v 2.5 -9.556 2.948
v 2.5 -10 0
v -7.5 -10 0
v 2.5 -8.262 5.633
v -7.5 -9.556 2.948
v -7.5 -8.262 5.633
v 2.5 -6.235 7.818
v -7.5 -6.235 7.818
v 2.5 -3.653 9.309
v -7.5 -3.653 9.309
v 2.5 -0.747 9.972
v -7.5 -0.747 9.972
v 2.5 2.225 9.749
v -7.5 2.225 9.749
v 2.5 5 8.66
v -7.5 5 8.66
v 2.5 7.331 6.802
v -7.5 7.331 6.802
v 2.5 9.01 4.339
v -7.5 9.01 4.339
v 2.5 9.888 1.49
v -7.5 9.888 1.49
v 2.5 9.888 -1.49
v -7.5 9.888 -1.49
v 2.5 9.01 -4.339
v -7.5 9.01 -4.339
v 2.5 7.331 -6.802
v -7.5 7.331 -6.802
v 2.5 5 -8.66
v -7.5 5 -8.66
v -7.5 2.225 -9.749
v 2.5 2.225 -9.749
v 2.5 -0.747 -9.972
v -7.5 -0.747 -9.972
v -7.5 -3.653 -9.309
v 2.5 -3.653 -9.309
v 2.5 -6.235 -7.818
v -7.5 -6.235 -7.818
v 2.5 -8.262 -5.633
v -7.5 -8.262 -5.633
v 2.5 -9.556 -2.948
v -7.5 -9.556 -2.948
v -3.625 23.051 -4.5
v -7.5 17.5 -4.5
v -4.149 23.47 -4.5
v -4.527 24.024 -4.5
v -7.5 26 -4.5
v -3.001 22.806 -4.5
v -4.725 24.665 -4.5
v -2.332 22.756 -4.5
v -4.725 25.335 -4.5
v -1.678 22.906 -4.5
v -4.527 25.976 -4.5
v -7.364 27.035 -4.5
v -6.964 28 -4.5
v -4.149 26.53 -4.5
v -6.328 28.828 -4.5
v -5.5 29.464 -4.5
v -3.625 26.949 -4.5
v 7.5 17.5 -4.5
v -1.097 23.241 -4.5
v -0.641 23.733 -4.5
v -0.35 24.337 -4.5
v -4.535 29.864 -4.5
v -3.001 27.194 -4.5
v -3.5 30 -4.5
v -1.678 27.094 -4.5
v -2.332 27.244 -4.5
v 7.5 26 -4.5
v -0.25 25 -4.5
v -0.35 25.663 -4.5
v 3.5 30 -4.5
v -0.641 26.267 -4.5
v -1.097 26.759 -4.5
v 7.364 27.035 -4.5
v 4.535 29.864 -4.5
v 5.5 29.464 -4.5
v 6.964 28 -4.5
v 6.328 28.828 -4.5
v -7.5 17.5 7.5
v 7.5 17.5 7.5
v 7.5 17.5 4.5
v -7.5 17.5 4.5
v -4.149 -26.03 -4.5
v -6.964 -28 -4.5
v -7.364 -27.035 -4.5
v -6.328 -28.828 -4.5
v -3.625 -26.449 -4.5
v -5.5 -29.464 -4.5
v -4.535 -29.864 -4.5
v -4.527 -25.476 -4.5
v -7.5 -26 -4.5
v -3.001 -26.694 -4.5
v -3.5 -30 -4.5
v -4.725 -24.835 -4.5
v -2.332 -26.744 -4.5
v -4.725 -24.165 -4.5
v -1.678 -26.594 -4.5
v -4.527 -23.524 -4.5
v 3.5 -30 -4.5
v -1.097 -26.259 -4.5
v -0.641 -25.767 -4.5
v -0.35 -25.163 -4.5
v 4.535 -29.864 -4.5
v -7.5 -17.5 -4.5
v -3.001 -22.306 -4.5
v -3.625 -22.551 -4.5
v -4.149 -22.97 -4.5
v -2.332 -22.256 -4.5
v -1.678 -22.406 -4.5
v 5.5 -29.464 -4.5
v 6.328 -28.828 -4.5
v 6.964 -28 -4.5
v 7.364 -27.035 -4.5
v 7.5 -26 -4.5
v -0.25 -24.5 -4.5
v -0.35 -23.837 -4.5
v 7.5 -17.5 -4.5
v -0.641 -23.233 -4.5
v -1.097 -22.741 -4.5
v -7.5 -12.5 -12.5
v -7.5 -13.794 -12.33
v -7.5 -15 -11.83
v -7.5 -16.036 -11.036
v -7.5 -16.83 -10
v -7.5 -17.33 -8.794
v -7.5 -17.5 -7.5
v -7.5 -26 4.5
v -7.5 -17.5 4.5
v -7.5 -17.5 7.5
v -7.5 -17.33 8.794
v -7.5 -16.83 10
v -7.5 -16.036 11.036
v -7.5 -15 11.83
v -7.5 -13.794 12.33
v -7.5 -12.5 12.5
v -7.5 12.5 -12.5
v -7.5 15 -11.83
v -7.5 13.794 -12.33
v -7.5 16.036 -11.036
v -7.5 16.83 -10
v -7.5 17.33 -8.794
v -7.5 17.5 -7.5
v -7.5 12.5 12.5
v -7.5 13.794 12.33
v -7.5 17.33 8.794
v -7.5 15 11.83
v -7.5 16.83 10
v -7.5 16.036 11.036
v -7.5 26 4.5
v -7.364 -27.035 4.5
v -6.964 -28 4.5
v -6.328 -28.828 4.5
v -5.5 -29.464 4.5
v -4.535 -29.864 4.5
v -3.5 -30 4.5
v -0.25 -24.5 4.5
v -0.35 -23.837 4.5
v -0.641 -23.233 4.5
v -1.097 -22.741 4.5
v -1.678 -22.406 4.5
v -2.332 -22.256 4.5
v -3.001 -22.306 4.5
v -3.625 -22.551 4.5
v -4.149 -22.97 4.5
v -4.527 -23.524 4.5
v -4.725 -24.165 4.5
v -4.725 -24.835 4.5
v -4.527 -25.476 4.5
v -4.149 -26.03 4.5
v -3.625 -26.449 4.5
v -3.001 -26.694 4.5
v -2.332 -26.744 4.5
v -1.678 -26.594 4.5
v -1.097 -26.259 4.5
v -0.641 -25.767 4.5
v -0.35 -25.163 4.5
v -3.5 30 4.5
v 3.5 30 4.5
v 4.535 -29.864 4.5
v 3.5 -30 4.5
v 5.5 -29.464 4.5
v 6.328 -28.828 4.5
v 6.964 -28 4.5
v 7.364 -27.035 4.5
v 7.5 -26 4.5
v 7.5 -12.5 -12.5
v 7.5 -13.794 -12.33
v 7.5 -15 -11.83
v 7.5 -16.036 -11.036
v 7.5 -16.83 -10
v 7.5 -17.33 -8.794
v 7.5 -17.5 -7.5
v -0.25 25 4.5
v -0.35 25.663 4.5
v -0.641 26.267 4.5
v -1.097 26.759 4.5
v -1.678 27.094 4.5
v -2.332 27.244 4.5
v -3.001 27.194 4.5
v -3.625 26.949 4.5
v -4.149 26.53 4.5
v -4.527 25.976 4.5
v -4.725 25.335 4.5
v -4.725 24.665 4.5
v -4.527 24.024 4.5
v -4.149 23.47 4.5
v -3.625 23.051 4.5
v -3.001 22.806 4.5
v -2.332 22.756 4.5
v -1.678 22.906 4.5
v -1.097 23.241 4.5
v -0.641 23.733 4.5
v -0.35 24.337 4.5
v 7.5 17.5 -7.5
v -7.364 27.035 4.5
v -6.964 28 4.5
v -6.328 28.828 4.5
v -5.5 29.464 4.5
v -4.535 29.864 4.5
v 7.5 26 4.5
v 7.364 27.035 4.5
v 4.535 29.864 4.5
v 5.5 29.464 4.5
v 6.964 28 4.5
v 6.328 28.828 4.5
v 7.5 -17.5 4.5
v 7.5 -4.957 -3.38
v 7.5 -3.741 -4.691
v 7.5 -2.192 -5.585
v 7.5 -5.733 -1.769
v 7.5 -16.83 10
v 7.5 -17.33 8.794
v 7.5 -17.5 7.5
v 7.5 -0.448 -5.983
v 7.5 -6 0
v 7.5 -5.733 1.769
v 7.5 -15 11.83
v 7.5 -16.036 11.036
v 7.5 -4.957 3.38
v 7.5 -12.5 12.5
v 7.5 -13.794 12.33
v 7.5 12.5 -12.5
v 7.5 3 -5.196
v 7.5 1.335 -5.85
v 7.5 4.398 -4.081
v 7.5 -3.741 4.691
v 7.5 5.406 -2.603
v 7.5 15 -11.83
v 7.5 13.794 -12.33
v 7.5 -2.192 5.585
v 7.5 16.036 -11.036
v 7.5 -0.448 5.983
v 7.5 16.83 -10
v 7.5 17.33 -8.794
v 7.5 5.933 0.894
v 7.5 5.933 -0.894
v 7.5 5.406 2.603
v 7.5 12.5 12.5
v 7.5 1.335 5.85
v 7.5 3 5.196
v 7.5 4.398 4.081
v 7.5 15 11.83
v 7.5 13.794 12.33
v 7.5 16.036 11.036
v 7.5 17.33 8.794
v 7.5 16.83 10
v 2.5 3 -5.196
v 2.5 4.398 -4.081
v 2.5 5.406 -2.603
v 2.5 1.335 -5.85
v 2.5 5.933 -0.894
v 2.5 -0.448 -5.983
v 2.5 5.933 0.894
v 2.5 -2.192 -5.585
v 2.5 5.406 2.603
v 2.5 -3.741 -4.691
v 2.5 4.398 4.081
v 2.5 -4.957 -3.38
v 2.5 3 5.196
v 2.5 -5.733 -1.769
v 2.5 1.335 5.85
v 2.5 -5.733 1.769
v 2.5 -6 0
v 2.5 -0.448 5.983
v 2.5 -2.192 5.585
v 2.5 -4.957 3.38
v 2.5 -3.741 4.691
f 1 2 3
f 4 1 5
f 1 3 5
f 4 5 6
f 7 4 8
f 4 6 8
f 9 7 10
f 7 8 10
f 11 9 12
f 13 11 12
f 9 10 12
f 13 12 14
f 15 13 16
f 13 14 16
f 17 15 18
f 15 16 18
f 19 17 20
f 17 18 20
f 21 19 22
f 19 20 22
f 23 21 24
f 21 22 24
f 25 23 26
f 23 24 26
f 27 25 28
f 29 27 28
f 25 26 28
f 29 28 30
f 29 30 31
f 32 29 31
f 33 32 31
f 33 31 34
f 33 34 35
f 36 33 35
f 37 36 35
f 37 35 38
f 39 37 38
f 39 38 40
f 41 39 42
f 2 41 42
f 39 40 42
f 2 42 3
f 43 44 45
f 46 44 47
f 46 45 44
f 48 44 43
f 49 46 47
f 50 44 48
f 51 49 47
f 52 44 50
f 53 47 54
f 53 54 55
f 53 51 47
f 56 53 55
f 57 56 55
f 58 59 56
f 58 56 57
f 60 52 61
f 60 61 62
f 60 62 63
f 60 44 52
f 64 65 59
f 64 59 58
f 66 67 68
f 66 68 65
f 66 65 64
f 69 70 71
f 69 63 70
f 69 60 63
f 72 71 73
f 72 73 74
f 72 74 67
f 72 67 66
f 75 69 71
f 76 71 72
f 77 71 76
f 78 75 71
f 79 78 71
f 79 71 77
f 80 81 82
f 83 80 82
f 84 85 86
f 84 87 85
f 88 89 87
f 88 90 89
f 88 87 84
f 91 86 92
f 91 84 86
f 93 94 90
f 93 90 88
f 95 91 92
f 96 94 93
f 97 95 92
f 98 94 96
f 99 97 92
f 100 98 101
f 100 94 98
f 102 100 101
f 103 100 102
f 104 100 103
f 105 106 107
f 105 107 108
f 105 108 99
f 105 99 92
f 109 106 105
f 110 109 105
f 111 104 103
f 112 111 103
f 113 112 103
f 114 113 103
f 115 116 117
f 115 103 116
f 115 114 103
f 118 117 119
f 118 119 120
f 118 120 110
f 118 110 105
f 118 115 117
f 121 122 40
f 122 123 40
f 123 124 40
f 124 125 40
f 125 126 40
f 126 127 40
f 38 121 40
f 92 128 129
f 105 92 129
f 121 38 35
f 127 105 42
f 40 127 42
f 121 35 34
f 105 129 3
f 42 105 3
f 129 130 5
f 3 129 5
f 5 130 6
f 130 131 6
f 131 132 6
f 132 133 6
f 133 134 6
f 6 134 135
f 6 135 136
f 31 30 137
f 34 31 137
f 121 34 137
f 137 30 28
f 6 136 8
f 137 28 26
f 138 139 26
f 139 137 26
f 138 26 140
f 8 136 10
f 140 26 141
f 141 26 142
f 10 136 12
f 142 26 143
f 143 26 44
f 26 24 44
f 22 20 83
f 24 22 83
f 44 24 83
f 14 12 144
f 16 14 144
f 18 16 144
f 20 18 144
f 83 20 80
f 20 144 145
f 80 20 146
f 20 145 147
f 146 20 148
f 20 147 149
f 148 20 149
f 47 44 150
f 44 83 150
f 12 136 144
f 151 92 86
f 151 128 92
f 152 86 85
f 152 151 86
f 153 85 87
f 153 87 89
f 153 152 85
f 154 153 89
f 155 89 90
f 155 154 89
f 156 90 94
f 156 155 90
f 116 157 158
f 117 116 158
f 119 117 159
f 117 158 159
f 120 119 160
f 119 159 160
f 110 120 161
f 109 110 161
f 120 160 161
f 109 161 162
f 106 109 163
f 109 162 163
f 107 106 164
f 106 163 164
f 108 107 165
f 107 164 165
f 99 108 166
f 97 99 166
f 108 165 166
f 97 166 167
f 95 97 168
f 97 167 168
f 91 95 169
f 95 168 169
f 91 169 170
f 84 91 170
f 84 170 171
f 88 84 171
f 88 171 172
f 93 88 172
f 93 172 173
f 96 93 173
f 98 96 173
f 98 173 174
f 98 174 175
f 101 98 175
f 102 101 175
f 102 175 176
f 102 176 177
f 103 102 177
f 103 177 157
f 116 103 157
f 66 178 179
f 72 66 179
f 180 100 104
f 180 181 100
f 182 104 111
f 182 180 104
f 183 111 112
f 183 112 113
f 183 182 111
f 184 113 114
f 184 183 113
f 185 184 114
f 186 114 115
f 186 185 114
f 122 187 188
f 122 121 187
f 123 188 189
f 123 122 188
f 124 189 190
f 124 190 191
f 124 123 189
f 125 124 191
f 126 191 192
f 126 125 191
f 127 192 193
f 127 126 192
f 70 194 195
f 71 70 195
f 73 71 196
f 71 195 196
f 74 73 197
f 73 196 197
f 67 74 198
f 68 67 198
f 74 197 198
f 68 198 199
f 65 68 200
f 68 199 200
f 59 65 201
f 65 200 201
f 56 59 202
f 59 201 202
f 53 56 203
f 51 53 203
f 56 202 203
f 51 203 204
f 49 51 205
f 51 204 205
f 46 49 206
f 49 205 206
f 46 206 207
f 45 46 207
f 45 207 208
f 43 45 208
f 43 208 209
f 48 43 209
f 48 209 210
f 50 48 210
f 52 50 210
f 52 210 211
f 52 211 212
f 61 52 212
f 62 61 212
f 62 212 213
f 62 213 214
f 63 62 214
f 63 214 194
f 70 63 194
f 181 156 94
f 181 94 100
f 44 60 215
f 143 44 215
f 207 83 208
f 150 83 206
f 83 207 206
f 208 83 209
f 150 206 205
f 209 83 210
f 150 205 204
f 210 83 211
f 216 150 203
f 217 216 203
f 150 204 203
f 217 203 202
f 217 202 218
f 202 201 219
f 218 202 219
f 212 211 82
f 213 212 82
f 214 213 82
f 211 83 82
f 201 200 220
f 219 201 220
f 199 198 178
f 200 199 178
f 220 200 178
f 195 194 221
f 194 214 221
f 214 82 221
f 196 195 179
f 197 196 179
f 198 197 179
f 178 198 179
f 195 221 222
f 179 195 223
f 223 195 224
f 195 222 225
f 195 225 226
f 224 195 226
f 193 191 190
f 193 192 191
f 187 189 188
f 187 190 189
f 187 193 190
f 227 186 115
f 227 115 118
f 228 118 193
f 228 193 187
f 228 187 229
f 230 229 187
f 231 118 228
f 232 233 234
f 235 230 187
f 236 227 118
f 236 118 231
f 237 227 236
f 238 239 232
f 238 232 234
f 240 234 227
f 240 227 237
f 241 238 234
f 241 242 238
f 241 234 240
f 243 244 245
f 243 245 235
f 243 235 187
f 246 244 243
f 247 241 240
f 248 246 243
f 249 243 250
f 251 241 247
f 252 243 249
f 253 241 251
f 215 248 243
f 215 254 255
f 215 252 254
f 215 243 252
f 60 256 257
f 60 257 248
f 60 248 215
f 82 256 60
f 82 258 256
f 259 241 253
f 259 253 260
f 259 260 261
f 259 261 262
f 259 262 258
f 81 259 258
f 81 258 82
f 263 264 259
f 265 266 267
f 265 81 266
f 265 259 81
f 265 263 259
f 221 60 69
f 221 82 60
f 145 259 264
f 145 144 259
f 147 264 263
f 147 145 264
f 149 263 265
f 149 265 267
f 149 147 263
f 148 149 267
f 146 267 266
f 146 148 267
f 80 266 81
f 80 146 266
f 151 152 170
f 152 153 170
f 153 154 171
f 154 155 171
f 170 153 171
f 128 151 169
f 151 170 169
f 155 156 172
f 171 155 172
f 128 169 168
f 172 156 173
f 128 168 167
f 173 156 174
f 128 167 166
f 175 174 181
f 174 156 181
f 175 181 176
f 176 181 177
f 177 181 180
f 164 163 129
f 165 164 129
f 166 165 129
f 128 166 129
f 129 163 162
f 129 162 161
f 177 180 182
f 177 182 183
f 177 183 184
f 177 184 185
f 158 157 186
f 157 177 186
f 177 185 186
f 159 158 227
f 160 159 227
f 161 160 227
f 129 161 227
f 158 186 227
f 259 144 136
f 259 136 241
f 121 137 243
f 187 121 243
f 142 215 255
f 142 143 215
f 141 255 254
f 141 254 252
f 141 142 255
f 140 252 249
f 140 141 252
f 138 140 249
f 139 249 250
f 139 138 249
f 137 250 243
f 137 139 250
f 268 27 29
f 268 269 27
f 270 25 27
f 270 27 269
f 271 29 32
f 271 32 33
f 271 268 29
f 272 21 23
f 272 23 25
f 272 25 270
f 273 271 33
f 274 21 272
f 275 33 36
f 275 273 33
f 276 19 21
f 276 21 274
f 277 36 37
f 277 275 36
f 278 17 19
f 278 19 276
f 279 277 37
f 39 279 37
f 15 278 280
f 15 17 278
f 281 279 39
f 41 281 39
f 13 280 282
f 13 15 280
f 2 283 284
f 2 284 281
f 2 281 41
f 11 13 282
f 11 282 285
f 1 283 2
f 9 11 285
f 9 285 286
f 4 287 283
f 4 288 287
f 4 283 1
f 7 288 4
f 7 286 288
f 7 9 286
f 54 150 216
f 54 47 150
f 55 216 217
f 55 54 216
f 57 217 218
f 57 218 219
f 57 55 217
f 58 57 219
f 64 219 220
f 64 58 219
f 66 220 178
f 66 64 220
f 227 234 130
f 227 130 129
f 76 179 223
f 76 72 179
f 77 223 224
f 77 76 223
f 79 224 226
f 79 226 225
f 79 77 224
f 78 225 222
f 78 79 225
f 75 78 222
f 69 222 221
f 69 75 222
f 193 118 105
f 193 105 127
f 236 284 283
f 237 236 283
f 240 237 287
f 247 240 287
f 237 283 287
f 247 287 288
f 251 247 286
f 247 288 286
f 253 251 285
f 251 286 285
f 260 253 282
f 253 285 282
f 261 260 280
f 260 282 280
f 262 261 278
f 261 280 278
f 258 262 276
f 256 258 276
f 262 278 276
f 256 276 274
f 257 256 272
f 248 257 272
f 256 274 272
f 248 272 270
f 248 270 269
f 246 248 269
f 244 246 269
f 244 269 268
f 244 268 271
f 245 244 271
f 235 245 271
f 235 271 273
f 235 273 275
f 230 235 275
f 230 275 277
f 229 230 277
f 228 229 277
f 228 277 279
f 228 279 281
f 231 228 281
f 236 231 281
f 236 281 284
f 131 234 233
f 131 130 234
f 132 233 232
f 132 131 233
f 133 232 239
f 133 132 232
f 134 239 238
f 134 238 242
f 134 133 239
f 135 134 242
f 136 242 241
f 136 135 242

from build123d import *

# Parameters (mm, degrees)
SKETCH2_W           = 15
SKETCH2_H           = 60
BOSS_EXTRUDE1_DEPTH = 12.5
SKETCH3_W           = 8
SKETCH3_H           = 12.5
CUT_EXTRUDE1_DEPTH  = 36.794552658
SKETCH4_R           = 2.25
CUT_EXTRUDE2_DEPTH  = 36.288099977
FILLET1_R           = 5
FILLET2_R           = 4
SKETCH5_R           = 6
CUT_EXTRUDE3_DEPTH  = 36.794552658
SKETCH6_R           = 10
CUT_EXTRUDE4_DEPTH  = 10


with BuildPart() as part:
    # Sketch2 → Boss-Extrude1 (new, symmetric)
    with BuildSketch(Plane.XY):
        Rectangle(SKETCH2_W, SKETCH2_H)
    extrude(amount=BOSS_EXTRUDE1_DEPTH, both=True)

    # Sketch3 → Cut-Extrude1 (cut, through all)
    with BuildSketch(Plane(origin=(7.5, 0, 0), x_dir=(0, 0, -1), z_dir=(1, 0, 0))):
        with Locations((-8.5, -23.75)):
            Rectangle(SKETCH3_W, SKETCH3_H)
        with Locations((8.5, -23.75)):
            Rectangle(SKETCH3_W, SKETCH3_H)
        with Locations((8.5, 23.75)):
            Rectangle(SKETCH3_W, SKETCH3_H)
        with Locations((-8.5, 23.75)):
            Rectangle(SKETCH3_W, SKETCH3_H)
    extrude(amount=-CUT_EXTRUDE1_DEPTH, mode=Mode.SUBTRACT)

    # Sketch4 → Cut-Extrude2 (cut, through all)
    with BuildSketch(Plane.XY.offset(4.5)):
        with Locations((-2.5, 25)):
            Circle(SKETCH4_R)
        with Locations((-2.5, -24.5)):
            Circle(SKETCH4_R)
    extrude(amount=-CUT_EXTRUDE2_DEPTH, mode=Mode.SUBTRACT)

    # Fillet1
    fillet1_edges = [part.edges().sort_by_distance(p)[0] for p in [
        (0, 17.5, 12.5),
        (0, 17.5, -12.5),
        (0, -17.5, -12.5),
        (0, -17.5, 12.5),
    ]]
    fillet(fillet1_edges, radius=FILLET1_R)

    # Fillet2
    fillet2_edges = [part.edges().sort_by_distance(p)[0] for p in [
        (7.5, -30, 0),
        (-7.5, -30, 0),
        (-7.5, 30, 0),
        (7.5, 30, 0),
    ]]
    fillet(fillet2_edges, radius=FILLET2_R)

    # Sketch5 → Cut-Extrude3 (cut, through all)
    with BuildSketch(Plane.ZY.offset(7.5)):
        with Locations(Location((0, 0, 0), (0, 0, 270))):
            Circle(SKETCH5_R)
    extrude(amount=-CUT_EXTRUDE3_DEPTH, mode=Mode.SUBTRACT)

    # Sketch6 → Cut-Extrude4 (cut)
    with BuildSketch(Plane.ZY.offset(7.5)):
        with Locations(Location((0, 0, 0), (0, 0, 270))):
            Circle(SKETCH6_R)
    extrude(amount=-CUT_EXTRUDE4_DEPTH, mode=Mode.SUBTRACT)


solid = part.part
